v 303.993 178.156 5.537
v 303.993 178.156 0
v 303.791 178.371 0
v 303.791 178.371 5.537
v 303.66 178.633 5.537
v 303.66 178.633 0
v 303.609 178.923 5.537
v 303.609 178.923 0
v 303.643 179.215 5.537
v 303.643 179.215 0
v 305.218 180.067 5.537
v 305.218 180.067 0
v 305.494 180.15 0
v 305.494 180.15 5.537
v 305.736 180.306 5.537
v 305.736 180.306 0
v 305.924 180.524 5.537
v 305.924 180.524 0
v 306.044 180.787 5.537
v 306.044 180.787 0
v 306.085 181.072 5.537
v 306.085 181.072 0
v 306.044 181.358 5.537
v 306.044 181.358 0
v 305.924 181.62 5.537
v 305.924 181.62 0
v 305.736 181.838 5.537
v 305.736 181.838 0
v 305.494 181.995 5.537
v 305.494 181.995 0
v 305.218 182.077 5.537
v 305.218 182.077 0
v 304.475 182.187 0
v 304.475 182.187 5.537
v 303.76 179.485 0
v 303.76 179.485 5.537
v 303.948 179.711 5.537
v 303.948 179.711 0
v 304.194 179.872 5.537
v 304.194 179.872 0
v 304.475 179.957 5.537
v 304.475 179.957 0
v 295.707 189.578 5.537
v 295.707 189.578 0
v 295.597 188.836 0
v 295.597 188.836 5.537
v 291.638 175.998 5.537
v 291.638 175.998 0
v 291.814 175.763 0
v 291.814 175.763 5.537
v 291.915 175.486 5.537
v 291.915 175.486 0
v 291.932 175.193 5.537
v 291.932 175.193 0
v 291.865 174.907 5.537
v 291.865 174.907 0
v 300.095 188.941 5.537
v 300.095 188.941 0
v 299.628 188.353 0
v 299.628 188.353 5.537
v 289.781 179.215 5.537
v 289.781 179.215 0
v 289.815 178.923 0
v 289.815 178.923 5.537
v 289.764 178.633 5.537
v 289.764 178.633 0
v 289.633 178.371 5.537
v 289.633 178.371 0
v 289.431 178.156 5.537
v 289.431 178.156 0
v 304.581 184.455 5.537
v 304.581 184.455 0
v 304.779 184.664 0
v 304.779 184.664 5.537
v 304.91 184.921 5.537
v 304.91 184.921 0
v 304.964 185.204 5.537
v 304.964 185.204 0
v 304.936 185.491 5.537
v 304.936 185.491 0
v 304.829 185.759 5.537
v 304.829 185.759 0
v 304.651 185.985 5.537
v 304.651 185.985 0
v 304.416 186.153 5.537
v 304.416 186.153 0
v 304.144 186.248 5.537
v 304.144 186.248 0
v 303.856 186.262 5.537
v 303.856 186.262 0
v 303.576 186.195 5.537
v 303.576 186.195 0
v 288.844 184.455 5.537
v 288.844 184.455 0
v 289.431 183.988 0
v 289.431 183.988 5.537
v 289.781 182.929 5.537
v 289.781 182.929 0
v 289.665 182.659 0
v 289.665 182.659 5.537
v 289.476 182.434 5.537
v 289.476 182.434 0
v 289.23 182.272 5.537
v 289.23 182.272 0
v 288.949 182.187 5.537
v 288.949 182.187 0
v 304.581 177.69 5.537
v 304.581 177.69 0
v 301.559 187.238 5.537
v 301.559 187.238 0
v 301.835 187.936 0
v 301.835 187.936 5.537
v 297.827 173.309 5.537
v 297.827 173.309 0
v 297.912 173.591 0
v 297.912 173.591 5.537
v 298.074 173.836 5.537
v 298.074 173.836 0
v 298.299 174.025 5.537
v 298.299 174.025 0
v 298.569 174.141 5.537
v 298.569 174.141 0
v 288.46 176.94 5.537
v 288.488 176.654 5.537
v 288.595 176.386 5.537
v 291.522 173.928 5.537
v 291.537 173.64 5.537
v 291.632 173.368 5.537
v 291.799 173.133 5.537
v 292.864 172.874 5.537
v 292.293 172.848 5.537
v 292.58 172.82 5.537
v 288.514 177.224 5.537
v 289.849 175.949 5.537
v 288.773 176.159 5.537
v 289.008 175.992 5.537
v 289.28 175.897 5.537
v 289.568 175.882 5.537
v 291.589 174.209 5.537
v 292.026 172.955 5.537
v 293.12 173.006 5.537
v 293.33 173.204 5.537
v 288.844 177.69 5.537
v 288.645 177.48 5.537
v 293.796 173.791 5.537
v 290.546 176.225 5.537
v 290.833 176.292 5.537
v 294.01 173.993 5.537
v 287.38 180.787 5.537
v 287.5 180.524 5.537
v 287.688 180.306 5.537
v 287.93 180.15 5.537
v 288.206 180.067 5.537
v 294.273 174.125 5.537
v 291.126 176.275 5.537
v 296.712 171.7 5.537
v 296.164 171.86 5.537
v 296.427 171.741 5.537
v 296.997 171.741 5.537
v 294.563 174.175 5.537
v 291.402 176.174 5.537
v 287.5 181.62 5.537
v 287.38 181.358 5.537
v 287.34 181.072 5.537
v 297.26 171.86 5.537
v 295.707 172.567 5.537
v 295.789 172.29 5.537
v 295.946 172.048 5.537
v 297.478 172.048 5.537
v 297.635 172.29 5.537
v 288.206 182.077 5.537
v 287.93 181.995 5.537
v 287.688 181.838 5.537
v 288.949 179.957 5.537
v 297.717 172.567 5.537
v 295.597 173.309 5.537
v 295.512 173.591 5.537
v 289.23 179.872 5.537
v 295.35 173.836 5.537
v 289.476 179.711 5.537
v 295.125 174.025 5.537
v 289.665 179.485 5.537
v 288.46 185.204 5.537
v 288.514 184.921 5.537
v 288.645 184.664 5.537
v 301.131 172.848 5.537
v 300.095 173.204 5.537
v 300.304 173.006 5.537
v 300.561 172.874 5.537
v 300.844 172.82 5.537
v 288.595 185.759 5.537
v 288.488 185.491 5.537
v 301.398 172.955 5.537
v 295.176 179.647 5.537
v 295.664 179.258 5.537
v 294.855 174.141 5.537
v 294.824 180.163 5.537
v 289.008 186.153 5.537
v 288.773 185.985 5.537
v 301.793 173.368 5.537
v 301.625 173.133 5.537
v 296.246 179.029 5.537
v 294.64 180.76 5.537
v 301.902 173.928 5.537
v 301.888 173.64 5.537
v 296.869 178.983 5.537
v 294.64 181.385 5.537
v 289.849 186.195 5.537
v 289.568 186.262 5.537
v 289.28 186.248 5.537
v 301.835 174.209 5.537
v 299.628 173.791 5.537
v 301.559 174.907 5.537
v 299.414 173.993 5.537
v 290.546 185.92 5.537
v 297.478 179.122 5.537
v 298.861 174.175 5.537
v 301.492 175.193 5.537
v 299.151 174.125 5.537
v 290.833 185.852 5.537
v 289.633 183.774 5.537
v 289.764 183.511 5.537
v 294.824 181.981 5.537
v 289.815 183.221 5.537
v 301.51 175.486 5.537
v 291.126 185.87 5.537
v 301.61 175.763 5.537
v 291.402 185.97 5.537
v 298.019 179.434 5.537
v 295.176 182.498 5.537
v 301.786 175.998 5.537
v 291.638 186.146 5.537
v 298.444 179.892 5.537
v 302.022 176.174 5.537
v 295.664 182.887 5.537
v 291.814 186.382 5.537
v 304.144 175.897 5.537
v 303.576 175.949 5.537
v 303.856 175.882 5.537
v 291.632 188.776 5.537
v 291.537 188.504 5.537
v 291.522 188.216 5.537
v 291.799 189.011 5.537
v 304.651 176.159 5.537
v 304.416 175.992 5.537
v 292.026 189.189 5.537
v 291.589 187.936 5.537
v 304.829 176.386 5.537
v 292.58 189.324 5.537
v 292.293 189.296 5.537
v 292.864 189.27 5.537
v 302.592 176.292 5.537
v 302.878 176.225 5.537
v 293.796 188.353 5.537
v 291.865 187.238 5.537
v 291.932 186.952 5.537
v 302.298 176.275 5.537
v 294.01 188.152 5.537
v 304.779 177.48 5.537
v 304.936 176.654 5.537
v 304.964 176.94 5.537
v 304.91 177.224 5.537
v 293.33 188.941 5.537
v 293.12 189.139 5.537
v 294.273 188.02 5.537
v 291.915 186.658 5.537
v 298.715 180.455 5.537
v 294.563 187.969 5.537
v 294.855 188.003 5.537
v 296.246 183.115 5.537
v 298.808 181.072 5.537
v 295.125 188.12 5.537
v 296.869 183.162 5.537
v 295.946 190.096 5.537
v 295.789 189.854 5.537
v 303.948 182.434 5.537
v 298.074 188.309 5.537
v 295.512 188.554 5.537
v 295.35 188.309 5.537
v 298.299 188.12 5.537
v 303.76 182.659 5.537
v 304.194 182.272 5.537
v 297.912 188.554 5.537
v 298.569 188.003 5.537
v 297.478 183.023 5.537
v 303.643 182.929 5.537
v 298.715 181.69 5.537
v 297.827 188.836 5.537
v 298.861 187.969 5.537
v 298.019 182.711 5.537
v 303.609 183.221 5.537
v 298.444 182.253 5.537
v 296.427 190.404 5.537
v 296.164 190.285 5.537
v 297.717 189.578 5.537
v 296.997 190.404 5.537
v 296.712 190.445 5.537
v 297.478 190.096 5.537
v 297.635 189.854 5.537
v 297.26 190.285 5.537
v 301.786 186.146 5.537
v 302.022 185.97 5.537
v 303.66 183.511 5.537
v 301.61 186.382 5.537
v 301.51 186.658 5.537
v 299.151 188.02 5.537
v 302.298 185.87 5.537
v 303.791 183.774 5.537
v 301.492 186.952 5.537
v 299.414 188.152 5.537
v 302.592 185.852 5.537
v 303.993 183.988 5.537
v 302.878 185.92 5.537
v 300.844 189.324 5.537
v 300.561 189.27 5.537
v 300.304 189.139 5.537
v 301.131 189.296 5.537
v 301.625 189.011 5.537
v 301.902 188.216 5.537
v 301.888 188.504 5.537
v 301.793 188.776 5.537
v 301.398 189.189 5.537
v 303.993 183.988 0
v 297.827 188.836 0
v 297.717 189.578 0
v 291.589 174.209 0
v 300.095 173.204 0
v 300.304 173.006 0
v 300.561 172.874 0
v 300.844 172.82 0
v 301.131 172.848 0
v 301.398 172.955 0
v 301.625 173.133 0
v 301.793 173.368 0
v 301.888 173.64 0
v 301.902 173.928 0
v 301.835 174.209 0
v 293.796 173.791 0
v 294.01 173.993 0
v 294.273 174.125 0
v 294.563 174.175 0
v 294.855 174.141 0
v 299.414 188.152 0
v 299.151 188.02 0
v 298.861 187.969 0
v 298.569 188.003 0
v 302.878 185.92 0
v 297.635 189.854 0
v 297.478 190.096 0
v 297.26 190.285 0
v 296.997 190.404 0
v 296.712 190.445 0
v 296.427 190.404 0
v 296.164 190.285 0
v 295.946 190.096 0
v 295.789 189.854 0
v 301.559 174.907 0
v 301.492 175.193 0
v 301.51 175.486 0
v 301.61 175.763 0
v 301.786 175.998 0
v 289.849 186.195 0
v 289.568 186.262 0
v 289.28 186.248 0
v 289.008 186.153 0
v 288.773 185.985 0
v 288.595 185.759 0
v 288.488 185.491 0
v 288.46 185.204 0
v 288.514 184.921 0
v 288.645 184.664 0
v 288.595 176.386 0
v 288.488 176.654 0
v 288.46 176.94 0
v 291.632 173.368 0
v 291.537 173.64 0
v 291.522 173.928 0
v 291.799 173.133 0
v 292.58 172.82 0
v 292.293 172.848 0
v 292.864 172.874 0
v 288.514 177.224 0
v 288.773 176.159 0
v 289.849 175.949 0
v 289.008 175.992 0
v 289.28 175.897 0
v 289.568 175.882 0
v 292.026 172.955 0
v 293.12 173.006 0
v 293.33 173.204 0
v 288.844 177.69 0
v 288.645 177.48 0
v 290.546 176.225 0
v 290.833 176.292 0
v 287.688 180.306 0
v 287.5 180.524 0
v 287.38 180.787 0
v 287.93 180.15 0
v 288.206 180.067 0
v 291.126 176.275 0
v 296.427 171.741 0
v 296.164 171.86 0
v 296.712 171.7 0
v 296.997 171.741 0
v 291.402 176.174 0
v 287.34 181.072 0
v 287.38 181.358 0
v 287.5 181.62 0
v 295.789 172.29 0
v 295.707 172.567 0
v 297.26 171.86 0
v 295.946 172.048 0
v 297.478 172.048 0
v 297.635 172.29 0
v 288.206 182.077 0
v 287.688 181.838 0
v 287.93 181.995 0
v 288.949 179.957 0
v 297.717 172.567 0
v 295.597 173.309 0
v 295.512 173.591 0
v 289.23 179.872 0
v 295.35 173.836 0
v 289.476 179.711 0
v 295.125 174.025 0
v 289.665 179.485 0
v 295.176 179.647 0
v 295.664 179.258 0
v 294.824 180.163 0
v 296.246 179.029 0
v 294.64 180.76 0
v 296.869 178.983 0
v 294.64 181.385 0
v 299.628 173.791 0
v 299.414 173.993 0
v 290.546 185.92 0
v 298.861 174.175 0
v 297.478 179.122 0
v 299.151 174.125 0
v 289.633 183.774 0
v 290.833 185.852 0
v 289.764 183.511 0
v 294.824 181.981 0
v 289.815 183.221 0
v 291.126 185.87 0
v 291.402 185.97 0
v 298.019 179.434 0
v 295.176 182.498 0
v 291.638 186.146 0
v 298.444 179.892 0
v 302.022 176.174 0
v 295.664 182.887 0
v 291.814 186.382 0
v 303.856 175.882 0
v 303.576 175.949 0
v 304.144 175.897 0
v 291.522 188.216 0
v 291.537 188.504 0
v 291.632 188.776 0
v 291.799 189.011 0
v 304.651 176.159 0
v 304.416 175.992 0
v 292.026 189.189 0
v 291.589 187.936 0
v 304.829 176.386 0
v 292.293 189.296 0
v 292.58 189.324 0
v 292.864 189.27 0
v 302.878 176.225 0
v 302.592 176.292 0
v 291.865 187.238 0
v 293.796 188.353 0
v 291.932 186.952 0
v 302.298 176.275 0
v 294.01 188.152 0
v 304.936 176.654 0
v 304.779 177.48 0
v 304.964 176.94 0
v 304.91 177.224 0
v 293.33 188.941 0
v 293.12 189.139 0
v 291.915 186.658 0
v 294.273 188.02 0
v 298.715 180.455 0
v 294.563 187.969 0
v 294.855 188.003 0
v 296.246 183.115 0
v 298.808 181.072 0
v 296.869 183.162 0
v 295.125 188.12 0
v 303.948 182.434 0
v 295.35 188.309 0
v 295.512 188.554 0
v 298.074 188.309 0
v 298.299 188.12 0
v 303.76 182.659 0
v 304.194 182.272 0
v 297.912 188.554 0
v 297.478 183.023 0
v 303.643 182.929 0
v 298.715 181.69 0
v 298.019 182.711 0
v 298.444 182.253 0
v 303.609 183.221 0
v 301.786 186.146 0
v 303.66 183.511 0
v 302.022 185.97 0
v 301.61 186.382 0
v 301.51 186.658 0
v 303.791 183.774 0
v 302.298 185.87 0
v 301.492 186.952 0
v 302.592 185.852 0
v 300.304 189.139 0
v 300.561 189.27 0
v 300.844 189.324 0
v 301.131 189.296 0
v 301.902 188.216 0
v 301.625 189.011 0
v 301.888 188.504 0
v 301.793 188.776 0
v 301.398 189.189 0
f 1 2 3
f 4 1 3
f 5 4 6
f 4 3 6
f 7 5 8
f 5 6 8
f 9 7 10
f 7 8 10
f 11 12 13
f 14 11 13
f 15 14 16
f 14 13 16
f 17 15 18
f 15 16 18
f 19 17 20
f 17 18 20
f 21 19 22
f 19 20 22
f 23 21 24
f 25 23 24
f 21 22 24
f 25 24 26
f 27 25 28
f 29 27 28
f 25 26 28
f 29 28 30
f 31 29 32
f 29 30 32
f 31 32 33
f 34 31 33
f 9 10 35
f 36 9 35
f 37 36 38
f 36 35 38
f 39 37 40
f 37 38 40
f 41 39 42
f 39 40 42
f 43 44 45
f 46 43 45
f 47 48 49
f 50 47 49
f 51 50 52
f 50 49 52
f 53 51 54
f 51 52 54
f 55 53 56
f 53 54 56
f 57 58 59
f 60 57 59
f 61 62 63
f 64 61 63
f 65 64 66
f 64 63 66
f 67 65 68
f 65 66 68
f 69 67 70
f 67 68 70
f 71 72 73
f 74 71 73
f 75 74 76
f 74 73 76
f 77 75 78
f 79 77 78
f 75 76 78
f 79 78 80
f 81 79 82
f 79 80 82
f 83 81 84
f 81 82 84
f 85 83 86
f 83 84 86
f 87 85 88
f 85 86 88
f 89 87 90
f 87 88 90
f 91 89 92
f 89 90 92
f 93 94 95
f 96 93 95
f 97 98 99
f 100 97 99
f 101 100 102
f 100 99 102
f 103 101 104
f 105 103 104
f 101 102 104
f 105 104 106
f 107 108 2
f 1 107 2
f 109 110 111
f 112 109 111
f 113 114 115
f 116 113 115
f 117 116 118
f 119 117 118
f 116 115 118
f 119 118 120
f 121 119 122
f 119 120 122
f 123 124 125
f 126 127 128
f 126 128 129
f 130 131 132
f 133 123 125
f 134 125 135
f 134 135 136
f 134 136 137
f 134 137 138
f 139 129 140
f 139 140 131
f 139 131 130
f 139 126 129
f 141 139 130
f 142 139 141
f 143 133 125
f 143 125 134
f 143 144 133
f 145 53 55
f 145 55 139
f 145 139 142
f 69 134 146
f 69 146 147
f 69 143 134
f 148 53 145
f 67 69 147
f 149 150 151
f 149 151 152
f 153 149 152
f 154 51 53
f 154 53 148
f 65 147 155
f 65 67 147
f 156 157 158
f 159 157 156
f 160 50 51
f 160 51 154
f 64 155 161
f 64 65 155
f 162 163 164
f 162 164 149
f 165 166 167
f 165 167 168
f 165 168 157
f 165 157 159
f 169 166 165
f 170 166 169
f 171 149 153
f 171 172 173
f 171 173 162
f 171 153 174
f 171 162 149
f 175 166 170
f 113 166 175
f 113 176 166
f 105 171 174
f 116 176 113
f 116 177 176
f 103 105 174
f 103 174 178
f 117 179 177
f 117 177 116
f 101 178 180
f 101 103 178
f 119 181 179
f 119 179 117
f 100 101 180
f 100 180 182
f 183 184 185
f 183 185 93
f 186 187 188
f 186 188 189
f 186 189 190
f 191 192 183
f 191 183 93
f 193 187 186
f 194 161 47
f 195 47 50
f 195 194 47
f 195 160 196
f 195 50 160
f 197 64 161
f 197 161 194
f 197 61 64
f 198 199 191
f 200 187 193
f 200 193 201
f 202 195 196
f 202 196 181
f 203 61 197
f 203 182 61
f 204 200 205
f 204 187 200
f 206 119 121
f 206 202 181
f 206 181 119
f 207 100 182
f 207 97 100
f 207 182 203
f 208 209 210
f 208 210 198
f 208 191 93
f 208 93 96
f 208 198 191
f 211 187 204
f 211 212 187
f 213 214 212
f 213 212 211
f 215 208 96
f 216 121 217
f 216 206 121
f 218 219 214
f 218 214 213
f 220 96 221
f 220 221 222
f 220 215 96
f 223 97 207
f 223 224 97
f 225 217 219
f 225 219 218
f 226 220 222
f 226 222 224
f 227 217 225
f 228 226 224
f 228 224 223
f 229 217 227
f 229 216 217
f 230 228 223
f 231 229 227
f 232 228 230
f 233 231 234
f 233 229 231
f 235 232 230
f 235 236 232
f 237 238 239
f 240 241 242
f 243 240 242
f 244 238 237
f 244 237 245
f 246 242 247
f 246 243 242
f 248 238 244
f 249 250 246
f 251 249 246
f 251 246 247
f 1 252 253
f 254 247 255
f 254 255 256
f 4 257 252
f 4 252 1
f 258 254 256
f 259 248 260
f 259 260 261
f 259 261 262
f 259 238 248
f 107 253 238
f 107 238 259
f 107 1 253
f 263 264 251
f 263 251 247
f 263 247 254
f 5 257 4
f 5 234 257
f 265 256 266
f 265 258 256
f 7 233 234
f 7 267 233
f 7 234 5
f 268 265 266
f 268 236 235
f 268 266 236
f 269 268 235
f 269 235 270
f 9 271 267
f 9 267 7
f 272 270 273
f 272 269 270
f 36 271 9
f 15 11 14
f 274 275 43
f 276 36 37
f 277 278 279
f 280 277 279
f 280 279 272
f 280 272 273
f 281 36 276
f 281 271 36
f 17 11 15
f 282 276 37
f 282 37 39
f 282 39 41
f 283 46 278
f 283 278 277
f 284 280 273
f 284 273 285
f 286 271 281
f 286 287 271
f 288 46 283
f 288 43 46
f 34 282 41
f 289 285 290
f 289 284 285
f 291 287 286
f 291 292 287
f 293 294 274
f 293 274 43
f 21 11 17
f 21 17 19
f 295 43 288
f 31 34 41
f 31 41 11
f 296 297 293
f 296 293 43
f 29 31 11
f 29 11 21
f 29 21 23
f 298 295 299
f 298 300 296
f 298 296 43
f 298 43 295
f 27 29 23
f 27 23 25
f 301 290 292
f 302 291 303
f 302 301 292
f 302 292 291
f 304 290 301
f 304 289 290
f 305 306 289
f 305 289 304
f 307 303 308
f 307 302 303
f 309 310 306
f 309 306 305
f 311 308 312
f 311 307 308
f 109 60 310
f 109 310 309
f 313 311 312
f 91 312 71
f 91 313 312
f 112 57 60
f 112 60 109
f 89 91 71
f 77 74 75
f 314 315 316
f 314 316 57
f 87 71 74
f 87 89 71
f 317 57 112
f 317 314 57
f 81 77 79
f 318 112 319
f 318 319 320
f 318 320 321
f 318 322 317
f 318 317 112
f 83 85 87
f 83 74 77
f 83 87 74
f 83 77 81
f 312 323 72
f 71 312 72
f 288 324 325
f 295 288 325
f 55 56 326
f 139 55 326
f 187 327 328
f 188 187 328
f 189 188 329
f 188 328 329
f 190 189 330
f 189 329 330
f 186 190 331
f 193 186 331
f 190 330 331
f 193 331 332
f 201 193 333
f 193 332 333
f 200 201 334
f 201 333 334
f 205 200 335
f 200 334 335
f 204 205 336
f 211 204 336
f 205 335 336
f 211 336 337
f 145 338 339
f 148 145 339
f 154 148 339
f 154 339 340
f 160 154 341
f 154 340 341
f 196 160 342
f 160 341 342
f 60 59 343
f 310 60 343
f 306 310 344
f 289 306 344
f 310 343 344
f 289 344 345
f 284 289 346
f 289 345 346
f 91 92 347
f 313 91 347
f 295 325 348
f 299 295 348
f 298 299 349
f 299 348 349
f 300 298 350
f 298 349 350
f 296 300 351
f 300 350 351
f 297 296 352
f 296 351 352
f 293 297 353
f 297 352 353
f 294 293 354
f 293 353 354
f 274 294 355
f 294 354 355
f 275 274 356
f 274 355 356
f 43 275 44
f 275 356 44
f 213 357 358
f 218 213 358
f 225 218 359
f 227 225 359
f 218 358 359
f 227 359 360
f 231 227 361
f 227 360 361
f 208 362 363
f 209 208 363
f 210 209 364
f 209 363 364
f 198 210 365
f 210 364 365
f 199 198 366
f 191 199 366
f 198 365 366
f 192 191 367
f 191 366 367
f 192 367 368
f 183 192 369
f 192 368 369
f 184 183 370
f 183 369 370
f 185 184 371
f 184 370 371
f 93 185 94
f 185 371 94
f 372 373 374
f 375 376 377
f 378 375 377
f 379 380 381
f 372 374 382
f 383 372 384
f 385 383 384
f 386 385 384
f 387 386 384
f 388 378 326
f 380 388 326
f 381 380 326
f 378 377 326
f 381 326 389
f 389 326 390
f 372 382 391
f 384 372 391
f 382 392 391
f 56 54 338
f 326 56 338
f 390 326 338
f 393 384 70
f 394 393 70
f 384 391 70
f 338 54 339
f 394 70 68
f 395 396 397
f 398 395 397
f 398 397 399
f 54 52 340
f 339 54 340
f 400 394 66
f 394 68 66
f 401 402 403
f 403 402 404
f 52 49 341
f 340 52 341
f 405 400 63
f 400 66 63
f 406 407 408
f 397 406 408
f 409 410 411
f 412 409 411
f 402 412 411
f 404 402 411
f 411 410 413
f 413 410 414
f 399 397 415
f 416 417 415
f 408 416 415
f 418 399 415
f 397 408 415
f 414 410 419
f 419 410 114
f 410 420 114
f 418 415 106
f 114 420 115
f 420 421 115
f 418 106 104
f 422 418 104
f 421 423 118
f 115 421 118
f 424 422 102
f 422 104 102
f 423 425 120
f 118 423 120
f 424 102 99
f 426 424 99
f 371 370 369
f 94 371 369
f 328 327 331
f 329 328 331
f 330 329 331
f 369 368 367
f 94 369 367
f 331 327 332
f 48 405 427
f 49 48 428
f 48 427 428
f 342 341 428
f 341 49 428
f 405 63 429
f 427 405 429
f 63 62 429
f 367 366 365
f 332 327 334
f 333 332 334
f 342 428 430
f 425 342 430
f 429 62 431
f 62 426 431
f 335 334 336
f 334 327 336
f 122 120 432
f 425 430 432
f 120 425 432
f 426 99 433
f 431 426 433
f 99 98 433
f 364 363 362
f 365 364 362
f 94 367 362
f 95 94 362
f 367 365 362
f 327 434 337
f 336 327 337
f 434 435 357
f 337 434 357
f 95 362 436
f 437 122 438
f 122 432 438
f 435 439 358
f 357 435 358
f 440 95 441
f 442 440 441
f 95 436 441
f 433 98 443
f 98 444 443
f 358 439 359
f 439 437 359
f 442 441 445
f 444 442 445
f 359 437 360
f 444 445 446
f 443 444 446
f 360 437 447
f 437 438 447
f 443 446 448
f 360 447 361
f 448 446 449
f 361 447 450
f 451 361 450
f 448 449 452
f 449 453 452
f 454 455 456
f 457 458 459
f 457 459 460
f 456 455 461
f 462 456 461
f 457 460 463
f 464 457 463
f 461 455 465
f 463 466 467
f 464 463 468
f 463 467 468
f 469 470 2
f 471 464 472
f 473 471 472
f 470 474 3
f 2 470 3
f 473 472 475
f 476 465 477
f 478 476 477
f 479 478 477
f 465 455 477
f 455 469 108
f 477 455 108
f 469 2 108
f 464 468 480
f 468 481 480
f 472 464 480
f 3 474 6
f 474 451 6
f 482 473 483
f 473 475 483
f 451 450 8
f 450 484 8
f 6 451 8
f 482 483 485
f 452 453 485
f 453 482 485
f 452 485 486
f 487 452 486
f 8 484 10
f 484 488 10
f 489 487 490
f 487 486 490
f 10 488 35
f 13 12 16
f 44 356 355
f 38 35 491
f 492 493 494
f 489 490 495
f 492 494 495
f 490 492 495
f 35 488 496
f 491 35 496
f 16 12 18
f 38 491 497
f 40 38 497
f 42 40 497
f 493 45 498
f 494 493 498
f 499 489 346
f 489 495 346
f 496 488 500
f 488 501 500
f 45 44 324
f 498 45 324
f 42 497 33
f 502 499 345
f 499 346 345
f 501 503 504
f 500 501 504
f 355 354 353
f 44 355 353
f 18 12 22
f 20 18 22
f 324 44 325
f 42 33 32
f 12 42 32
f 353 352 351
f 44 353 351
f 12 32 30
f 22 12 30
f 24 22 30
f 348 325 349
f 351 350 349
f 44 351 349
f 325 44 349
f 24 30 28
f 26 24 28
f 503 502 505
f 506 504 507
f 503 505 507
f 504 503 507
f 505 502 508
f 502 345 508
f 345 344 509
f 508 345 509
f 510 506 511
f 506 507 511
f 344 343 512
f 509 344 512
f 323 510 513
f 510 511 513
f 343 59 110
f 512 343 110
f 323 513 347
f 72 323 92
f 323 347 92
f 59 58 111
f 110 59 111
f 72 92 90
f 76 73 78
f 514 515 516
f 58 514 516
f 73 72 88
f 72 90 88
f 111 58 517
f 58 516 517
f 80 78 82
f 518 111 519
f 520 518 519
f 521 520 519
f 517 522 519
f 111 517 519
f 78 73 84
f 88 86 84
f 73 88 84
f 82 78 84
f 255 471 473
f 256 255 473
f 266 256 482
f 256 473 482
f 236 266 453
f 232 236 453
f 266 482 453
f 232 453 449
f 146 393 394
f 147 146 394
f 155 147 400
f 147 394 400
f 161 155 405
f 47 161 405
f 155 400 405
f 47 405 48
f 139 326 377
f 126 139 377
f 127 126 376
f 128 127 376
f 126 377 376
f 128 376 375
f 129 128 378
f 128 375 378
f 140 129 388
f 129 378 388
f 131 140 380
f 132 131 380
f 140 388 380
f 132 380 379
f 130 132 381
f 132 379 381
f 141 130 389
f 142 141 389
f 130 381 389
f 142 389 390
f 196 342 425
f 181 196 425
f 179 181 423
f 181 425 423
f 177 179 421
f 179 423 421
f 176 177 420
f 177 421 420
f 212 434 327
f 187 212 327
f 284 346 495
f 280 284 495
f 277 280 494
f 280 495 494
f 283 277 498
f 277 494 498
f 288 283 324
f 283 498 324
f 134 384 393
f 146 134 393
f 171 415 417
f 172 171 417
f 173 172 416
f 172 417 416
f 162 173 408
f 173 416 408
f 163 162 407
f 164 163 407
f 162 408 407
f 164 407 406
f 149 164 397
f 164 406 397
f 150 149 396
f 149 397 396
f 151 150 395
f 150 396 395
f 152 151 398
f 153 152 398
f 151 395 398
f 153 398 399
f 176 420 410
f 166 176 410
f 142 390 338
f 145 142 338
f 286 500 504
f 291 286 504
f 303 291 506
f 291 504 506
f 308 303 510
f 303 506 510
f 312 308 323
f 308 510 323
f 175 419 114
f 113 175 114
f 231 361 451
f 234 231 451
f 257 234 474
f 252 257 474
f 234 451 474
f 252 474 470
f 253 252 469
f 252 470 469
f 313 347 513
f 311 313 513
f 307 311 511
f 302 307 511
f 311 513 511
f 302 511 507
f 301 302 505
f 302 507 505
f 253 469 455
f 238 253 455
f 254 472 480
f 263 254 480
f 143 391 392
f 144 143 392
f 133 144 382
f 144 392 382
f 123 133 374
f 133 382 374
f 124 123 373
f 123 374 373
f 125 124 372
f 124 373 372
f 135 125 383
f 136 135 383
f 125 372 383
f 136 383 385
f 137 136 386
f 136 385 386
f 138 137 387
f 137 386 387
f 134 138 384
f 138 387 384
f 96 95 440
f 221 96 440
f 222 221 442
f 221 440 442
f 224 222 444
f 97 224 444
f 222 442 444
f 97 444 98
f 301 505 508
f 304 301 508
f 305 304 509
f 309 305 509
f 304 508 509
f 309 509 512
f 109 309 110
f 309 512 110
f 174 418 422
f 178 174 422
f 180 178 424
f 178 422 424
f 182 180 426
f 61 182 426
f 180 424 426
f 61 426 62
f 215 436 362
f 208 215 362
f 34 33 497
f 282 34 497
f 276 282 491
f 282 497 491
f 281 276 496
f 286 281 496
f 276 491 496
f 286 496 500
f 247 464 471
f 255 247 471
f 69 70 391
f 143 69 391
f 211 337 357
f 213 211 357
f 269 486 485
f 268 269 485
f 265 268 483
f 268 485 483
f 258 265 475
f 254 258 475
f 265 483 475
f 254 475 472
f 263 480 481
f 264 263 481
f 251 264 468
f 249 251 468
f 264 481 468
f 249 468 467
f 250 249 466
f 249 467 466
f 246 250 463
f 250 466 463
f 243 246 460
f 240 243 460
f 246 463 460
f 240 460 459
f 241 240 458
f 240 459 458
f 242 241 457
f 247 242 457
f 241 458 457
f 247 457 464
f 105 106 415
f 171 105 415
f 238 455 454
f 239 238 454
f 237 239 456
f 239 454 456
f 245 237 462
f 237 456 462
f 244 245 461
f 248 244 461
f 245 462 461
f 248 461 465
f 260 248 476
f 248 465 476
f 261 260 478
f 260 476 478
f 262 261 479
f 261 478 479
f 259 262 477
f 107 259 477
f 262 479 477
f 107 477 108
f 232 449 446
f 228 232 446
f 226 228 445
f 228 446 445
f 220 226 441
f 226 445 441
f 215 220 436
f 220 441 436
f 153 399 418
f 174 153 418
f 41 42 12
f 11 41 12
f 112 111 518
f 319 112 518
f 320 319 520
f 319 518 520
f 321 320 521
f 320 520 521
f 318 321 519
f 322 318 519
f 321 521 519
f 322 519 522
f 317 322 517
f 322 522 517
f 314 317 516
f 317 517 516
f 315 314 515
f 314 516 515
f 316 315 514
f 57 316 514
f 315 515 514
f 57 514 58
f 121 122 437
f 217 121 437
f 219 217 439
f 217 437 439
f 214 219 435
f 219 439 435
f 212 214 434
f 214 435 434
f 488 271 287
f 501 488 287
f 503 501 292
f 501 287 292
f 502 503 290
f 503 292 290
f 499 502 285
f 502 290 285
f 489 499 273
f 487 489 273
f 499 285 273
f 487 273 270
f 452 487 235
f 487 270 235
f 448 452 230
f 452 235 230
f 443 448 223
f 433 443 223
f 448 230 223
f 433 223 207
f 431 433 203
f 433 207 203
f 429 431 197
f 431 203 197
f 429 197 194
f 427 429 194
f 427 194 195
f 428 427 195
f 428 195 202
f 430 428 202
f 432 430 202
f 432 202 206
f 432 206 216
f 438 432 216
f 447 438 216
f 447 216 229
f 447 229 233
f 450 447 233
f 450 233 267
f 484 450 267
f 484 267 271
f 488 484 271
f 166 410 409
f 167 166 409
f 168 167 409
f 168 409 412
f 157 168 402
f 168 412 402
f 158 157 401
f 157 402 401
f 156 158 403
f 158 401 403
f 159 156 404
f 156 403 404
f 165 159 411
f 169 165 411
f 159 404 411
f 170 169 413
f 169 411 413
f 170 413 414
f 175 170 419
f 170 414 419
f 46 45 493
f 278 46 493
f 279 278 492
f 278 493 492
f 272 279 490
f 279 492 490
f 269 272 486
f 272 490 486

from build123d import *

# Parameters (mm, degrees)
BOSS_EXTRUDE1_DEPTH = 5.5372
SKETCH3_R           = 2.0955
CUT_EXTRUDE1_DEPTH  = 361.538157474


with BuildPart() as part:
    # Sketch2 → Boss-Extrude1 (new body)
    with BuildSketch(Plane.XY):
        with BuildLine():
            Line((300.094596165, 188.940880076), (299.62806999, 188.353043175))
            ThreePointArc((299.62806999, 188.353043175), (299.150949063, 188.019920142), (298.569281031, 188.003257744))
            ThreePointArc((298.569281031, 188.003257744), (298.073872939, 188.308521819), (297.827235612, 188.835575292))
            Line((297.827235612, 188.835575292), (297.717130543, 189.577920069))
            ThreePointArc((297.717130543, 189.577920069), (296.712124973, 190.444856977), (295.707119404, 189.577920069))
            Line((295.707119404, 189.577920069), (295.597014335, 188.835575292))
            ThreePointArc((295.597014335, 188.835575292), (295.350377008, 188.308521819), (294.854968915, 188.003257744))
            ThreePointArc((294.854968915, 188.003257744), (294.273300884, 188.019920142), (293.796179957, 188.353043175))
            Line((293.796179957, 188.353043175), (293.329653782, 188.940880076))
            ThreePointArc((293.329653782, 188.940880076), (292.025824973, 189.189166677), (291.588933073, 187.935874506))
            Line((291.588933073, 187.935874506), (291.864751675, 187.237932536))
            ThreePointArc((291.864751675, 187.237932536), (291.914684221, 186.658172176), (291.638280265, 186.146101686))
            ThreePointArc((291.638280265, 186.146101686), (291.126209774, 185.86969773), (290.546449415, 185.919630276))
            Line((290.546449415, 185.919630276), (289.848507445, 186.195448877))
            ThreePointArc((289.848507445, 186.195448877), (288.595215274, 185.758556977), (288.843501875, 184.454728169))
            Line((288.843501875, 184.454728169), (289.431338776, 183.988201994))
            ThreePointArc((289.431338776, 183.988201994), (289.764461809, 183.511081067), (289.781124207, 182.929413036))
            ThreePointArc((289.781124207, 182.929413036), (289.475860132, 182.434004943), (288.948806659, 182.187367616))
            Line((288.948806659, 182.187367616), (288.206461882, 182.077262547))
            ThreePointArc((288.206461882, 182.077262547), (287.339524973, 181.072256977), (288.206461882, 180.067251408))
            Line((288.206461882, 180.067251408), (288.948806659, 179.957146339))
            ThreePointArc((288.948806659, 179.957146339), (289.475860132, 179.710509012), (289.781124207, 179.215100919))
            ThreePointArc((289.781124207, 179.215100919), (289.764461809, 178.633432888), (289.431338776, 178.156311961))
            Line((289.431338776, 178.156311961), (288.843501875, 177.689785786))
            ThreePointArc((288.843501875, 177.689785786), (288.595215274, 176.385956977), (289.848507445, 175.949065077))
            Line((289.848507445, 175.949065077), (290.546449415, 176.224883679))
            ThreePointArc((290.546449415, 176.224883679), (291.126209774, 176.274816225), (291.638280265, 175.998412269))
            ThreePointArc((291.638280265, 175.998412269), (291.914684221, 175.486341779), (291.864751675, 174.906581419))
            Line((291.864751675, 174.906581419), (291.588933073, 174.208639449))
            ThreePointArc((291.588933073, 174.208639449), (292.025824973, 172.955347278), (293.329653782, 173.203633879))
            Line((293.329653782, 173.203633879), (293.796179957, 173.79147078))
            ThreePointArc((293.796179957, 173.79147078), (294.273300884, 174.124593813), (294.854968915, 174.141256211))
            ThreePointArc((294.854968915, 174.141256211), (295.350377008, 173.835992136), (295.597014335, 173.308938663))
            Line((295.597014335, 173.308938663), (295.707119404, 172.566593886))
            ThreePointArc((295.707119404, 172.566593886), (296.712124973, 171.699656977), (297.717130543, 172.566593886))
            Line((297.717130543, 172.566593886), (297.827235612, 173.308938663))
            ThreePointArc((297.827235612, 173.308938663), (298.073872939, 173.835992136), (298.569281031, 174.141256211))
            ThreePointArc((298.569281031, 174.141256211), (299.150949063, 174.124593813), (299.62806999, 173.79147078))
            Line((299.62806999, 173.79147078), (300.094596165, 173.203633879))
            ThreePointArc((300.094596165, 173.203633879), (301.398424973, 172.955347278), (301.835316873, 174.208639449))
            Line((301.835316873, 174.208639449), (301.559498271, 174.906581419))
            ThreePointArc((301.559498271, 174.906581419), (301.509565726, 175.486341779), (301.785969682, 175.998412269))
            ThreePointArc((301.785969682, 175.998412269), (302.298040172, 176.274816225), (302.877800532, 176.224883679))
            Line((302.877800532, 176.224883679), (303.575742502, 175.949065077))
            ThreePointArc((303.575742502, 175.949065077), (304.829034673, 176.385956977), (304.580748071, 177.689785786))
            Line((304.580748071, 177.689785786), (303.99291117, 178.156311961))
            ThreePointArc((303.99291117, 178.156311961), (303.659788137, 178.633432888), (303.64312574, 179.215100919))
            ThreePointArc((303.64312574, 179.215100919), (303.948389815, 179.710509012), (304.475443288, 179.957146339))
            Line((304.475443288, 179.957146339), (305.217788065, 180.067251408))
            ThreePointArc((305.217788065, 180.067251408), (306.084724973, 181.072256977), (305.217788065, 182.077262547))
            Line((305.217788065, 182.077262547), (304.475443288, 182.187367616))
            ThreePointArc((304.475443288, 182.187367616), (303.948389815, 182.434004943), (303.64312574, 182.929413036))
            ThreePointArc((303.64312574, 182.929413036), (303.659788137, 183.511081067), (303.99291117, 183.988201994))
            Line((303.99291117, 183.988201994), (304.580748071, 184.454728169))
            ThreePointArc((304.580748071, 184.454728169), (304.829034673, 185.758556977), (303.575742502, 186.195448877))
            Line((303.575742502, 186.195448877), (302.877800532, 185.919630276))
            ThreePointArc((302.877800532, 185.919630276), (302.298040172, 185.86969773), (301.785969682, 186.146101686))
            ThreePointArc((301.785969682, 186.146101686), (301.509565726, 186.658172176), (301.559498271, 187.237932536))
            Line((301.559498271, 187.237932536), (301.835316873, 187.935874506))
            ThreePointArc((301.835316873, 187.935874506), (301.398424973, 189.189166677), (300.094596165, 188.940880076))
        make_face()
    extrude(amount=BOSS_EXTRUDE1_DEPTH)

    # Sketch3 → Cut-Extrude1 (cut, through all)
    with BuildSketch(Plane.XY.offset(5.5372)):
        with Locations((296.712124973, 181.072256977)):
            Circle(SKETCH3_R)
    extrude(amount=-CUT_EXTRUDE1_DEPTH, mode=Mode.SUBTRACT)


solid = part.part
